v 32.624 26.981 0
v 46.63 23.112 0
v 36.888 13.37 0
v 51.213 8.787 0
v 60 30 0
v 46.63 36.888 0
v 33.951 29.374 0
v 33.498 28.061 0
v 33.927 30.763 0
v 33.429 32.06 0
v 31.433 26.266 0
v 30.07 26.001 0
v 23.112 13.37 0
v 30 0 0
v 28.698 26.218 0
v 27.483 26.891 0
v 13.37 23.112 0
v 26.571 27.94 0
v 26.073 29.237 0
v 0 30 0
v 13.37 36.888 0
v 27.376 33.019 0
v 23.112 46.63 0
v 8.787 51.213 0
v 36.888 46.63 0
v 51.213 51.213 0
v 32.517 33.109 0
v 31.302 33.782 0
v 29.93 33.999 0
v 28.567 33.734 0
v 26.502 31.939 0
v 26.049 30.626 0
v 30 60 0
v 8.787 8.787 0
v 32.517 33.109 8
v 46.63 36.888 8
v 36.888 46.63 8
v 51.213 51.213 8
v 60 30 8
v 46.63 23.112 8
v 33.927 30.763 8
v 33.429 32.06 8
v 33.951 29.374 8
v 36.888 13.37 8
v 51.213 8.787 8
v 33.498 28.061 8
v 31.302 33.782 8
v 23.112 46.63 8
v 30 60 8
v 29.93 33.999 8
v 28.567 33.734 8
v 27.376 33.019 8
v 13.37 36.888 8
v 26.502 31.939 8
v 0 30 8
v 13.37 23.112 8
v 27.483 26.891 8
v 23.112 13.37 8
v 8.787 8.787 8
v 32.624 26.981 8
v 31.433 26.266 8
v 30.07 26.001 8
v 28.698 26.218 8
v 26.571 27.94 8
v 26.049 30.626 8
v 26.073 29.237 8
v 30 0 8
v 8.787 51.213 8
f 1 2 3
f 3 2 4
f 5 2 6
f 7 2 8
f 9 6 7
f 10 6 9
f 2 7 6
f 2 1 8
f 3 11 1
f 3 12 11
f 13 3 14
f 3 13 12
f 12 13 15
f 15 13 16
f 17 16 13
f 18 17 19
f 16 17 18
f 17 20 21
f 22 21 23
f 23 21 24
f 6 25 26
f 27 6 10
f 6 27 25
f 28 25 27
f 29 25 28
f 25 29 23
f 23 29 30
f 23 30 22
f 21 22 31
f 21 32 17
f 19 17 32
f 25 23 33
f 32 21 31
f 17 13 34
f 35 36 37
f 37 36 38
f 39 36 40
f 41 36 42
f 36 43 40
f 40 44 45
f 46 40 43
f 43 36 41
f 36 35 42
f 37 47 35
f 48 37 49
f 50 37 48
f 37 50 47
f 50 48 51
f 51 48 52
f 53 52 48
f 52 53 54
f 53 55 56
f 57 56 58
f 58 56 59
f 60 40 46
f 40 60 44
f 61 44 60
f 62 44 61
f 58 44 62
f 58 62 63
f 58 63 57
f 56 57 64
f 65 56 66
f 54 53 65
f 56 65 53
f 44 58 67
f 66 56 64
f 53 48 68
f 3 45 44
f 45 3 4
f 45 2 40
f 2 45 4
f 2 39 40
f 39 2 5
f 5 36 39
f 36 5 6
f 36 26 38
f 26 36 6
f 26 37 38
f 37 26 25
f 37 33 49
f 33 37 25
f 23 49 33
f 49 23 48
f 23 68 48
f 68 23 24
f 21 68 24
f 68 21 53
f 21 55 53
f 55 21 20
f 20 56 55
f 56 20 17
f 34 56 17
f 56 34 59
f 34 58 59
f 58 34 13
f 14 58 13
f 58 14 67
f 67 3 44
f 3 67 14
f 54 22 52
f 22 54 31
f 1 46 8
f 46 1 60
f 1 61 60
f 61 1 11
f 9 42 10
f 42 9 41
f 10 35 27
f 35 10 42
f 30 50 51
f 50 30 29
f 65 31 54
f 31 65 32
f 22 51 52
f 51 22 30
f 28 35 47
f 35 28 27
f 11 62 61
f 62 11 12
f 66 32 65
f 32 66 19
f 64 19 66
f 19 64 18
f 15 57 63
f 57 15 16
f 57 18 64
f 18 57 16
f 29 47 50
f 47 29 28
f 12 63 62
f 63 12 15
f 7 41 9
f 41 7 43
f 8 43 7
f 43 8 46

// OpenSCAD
$fn = 32;

// ----------------------------------------------------------------------
// Star wheel: 8-point blunt, R30
// ----------------------------------------------------------------------

// --- parameters (mm) ---
n_points = 8;             // number of points / teeth
r_out = 30;               // tip radius
r_in = 18;                // root radius
bore_r = 4;               // centre bore radius
plate_t = 8;              // plate thickness, Z (extrusion height)
bore_d = 8;               // centre bore diameter

profile = [[0, 30], [13.37, 23.112], [8.787, 8.787], [23.112, 13.37], [30, 0], [36.888, 13.37], [51.213, 8.787], [46.63, 23.112], [60, 30], [46.63, 36.888], [51.213, 51.213], [36.888, 46.63], [30, 60], [23.112, 46.63], [8.787, 51.213], [13.37, 36.888]];  // primary outline, 16 points, counter clockwise
void_1 = [[33.927, 30.763], [33.429, 32.06], [32.517, 33.109], [31.302, 33.782], [29.93, 33.999], [28.567, 33.734], [27.376, 33.019], [26.502, 31.939], [26.049, 30.626], [26.073, 29.237], [26.571, 27.94], [27.483, 26.891], [28.698, 26.218], [30.07, 26.001], [31.433, 26.266], [32.624, 26.981], [33.498, 28.061], [33.951, 29.374]];  // centre bore, 18 points

// --- the one profile operation ---
difference() {
  linear_extrude(height = plate_t) polygon(points = profile);
  translate([0, 0, -1])
    linear_extrude(height = plate_t + 2) polygon(points = void_1);
}
